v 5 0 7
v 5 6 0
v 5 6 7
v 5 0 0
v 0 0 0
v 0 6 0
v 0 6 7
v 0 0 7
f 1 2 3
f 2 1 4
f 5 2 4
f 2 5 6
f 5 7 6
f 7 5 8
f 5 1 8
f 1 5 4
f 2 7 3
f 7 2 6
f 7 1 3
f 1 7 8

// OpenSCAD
translate([2.5, 1.5, 1.0]) color([0.8491315553121948, 0.95846907728749, 0.38764569013819994]) cube([5, 3, 2], center=true);
translate([2.5, 4.5, 1.0]) color([0.29380353478258403, 0.7457841029207014, 0.9575468650535228]) cube([5, 3, 2], center=true);
translate([2.5, 1.5, 3.0]) color([0.98339807845839, 0.12155240415787172, 0.8604321836344089]) cube([5, 3, 2], center=true);
translate([2.5, 4.5, 3.0]) color([0.9958411320233901, 0.03818441020037311, 0.39202639046743215]) cube([5, 3, 2], center=true);
translate([2.5, 1.0, 5.5]) color([0.3715816420064585, 0.19047756087385292, 0.3565538137373233]) cube([5, 2, 3], center=true);
translate([2.5, 3.0, 5.5]) color([0.6320134108911423, 0.9564975354421206, 0.901927522825372]) cube([5, 2, 3], center=true);
translate([2.5, 5.0, 5.5]) color([0.039980675922074105, 0.2553863294502452, 0.02665600139486224]) cube([5, 2, 3], center=true);
